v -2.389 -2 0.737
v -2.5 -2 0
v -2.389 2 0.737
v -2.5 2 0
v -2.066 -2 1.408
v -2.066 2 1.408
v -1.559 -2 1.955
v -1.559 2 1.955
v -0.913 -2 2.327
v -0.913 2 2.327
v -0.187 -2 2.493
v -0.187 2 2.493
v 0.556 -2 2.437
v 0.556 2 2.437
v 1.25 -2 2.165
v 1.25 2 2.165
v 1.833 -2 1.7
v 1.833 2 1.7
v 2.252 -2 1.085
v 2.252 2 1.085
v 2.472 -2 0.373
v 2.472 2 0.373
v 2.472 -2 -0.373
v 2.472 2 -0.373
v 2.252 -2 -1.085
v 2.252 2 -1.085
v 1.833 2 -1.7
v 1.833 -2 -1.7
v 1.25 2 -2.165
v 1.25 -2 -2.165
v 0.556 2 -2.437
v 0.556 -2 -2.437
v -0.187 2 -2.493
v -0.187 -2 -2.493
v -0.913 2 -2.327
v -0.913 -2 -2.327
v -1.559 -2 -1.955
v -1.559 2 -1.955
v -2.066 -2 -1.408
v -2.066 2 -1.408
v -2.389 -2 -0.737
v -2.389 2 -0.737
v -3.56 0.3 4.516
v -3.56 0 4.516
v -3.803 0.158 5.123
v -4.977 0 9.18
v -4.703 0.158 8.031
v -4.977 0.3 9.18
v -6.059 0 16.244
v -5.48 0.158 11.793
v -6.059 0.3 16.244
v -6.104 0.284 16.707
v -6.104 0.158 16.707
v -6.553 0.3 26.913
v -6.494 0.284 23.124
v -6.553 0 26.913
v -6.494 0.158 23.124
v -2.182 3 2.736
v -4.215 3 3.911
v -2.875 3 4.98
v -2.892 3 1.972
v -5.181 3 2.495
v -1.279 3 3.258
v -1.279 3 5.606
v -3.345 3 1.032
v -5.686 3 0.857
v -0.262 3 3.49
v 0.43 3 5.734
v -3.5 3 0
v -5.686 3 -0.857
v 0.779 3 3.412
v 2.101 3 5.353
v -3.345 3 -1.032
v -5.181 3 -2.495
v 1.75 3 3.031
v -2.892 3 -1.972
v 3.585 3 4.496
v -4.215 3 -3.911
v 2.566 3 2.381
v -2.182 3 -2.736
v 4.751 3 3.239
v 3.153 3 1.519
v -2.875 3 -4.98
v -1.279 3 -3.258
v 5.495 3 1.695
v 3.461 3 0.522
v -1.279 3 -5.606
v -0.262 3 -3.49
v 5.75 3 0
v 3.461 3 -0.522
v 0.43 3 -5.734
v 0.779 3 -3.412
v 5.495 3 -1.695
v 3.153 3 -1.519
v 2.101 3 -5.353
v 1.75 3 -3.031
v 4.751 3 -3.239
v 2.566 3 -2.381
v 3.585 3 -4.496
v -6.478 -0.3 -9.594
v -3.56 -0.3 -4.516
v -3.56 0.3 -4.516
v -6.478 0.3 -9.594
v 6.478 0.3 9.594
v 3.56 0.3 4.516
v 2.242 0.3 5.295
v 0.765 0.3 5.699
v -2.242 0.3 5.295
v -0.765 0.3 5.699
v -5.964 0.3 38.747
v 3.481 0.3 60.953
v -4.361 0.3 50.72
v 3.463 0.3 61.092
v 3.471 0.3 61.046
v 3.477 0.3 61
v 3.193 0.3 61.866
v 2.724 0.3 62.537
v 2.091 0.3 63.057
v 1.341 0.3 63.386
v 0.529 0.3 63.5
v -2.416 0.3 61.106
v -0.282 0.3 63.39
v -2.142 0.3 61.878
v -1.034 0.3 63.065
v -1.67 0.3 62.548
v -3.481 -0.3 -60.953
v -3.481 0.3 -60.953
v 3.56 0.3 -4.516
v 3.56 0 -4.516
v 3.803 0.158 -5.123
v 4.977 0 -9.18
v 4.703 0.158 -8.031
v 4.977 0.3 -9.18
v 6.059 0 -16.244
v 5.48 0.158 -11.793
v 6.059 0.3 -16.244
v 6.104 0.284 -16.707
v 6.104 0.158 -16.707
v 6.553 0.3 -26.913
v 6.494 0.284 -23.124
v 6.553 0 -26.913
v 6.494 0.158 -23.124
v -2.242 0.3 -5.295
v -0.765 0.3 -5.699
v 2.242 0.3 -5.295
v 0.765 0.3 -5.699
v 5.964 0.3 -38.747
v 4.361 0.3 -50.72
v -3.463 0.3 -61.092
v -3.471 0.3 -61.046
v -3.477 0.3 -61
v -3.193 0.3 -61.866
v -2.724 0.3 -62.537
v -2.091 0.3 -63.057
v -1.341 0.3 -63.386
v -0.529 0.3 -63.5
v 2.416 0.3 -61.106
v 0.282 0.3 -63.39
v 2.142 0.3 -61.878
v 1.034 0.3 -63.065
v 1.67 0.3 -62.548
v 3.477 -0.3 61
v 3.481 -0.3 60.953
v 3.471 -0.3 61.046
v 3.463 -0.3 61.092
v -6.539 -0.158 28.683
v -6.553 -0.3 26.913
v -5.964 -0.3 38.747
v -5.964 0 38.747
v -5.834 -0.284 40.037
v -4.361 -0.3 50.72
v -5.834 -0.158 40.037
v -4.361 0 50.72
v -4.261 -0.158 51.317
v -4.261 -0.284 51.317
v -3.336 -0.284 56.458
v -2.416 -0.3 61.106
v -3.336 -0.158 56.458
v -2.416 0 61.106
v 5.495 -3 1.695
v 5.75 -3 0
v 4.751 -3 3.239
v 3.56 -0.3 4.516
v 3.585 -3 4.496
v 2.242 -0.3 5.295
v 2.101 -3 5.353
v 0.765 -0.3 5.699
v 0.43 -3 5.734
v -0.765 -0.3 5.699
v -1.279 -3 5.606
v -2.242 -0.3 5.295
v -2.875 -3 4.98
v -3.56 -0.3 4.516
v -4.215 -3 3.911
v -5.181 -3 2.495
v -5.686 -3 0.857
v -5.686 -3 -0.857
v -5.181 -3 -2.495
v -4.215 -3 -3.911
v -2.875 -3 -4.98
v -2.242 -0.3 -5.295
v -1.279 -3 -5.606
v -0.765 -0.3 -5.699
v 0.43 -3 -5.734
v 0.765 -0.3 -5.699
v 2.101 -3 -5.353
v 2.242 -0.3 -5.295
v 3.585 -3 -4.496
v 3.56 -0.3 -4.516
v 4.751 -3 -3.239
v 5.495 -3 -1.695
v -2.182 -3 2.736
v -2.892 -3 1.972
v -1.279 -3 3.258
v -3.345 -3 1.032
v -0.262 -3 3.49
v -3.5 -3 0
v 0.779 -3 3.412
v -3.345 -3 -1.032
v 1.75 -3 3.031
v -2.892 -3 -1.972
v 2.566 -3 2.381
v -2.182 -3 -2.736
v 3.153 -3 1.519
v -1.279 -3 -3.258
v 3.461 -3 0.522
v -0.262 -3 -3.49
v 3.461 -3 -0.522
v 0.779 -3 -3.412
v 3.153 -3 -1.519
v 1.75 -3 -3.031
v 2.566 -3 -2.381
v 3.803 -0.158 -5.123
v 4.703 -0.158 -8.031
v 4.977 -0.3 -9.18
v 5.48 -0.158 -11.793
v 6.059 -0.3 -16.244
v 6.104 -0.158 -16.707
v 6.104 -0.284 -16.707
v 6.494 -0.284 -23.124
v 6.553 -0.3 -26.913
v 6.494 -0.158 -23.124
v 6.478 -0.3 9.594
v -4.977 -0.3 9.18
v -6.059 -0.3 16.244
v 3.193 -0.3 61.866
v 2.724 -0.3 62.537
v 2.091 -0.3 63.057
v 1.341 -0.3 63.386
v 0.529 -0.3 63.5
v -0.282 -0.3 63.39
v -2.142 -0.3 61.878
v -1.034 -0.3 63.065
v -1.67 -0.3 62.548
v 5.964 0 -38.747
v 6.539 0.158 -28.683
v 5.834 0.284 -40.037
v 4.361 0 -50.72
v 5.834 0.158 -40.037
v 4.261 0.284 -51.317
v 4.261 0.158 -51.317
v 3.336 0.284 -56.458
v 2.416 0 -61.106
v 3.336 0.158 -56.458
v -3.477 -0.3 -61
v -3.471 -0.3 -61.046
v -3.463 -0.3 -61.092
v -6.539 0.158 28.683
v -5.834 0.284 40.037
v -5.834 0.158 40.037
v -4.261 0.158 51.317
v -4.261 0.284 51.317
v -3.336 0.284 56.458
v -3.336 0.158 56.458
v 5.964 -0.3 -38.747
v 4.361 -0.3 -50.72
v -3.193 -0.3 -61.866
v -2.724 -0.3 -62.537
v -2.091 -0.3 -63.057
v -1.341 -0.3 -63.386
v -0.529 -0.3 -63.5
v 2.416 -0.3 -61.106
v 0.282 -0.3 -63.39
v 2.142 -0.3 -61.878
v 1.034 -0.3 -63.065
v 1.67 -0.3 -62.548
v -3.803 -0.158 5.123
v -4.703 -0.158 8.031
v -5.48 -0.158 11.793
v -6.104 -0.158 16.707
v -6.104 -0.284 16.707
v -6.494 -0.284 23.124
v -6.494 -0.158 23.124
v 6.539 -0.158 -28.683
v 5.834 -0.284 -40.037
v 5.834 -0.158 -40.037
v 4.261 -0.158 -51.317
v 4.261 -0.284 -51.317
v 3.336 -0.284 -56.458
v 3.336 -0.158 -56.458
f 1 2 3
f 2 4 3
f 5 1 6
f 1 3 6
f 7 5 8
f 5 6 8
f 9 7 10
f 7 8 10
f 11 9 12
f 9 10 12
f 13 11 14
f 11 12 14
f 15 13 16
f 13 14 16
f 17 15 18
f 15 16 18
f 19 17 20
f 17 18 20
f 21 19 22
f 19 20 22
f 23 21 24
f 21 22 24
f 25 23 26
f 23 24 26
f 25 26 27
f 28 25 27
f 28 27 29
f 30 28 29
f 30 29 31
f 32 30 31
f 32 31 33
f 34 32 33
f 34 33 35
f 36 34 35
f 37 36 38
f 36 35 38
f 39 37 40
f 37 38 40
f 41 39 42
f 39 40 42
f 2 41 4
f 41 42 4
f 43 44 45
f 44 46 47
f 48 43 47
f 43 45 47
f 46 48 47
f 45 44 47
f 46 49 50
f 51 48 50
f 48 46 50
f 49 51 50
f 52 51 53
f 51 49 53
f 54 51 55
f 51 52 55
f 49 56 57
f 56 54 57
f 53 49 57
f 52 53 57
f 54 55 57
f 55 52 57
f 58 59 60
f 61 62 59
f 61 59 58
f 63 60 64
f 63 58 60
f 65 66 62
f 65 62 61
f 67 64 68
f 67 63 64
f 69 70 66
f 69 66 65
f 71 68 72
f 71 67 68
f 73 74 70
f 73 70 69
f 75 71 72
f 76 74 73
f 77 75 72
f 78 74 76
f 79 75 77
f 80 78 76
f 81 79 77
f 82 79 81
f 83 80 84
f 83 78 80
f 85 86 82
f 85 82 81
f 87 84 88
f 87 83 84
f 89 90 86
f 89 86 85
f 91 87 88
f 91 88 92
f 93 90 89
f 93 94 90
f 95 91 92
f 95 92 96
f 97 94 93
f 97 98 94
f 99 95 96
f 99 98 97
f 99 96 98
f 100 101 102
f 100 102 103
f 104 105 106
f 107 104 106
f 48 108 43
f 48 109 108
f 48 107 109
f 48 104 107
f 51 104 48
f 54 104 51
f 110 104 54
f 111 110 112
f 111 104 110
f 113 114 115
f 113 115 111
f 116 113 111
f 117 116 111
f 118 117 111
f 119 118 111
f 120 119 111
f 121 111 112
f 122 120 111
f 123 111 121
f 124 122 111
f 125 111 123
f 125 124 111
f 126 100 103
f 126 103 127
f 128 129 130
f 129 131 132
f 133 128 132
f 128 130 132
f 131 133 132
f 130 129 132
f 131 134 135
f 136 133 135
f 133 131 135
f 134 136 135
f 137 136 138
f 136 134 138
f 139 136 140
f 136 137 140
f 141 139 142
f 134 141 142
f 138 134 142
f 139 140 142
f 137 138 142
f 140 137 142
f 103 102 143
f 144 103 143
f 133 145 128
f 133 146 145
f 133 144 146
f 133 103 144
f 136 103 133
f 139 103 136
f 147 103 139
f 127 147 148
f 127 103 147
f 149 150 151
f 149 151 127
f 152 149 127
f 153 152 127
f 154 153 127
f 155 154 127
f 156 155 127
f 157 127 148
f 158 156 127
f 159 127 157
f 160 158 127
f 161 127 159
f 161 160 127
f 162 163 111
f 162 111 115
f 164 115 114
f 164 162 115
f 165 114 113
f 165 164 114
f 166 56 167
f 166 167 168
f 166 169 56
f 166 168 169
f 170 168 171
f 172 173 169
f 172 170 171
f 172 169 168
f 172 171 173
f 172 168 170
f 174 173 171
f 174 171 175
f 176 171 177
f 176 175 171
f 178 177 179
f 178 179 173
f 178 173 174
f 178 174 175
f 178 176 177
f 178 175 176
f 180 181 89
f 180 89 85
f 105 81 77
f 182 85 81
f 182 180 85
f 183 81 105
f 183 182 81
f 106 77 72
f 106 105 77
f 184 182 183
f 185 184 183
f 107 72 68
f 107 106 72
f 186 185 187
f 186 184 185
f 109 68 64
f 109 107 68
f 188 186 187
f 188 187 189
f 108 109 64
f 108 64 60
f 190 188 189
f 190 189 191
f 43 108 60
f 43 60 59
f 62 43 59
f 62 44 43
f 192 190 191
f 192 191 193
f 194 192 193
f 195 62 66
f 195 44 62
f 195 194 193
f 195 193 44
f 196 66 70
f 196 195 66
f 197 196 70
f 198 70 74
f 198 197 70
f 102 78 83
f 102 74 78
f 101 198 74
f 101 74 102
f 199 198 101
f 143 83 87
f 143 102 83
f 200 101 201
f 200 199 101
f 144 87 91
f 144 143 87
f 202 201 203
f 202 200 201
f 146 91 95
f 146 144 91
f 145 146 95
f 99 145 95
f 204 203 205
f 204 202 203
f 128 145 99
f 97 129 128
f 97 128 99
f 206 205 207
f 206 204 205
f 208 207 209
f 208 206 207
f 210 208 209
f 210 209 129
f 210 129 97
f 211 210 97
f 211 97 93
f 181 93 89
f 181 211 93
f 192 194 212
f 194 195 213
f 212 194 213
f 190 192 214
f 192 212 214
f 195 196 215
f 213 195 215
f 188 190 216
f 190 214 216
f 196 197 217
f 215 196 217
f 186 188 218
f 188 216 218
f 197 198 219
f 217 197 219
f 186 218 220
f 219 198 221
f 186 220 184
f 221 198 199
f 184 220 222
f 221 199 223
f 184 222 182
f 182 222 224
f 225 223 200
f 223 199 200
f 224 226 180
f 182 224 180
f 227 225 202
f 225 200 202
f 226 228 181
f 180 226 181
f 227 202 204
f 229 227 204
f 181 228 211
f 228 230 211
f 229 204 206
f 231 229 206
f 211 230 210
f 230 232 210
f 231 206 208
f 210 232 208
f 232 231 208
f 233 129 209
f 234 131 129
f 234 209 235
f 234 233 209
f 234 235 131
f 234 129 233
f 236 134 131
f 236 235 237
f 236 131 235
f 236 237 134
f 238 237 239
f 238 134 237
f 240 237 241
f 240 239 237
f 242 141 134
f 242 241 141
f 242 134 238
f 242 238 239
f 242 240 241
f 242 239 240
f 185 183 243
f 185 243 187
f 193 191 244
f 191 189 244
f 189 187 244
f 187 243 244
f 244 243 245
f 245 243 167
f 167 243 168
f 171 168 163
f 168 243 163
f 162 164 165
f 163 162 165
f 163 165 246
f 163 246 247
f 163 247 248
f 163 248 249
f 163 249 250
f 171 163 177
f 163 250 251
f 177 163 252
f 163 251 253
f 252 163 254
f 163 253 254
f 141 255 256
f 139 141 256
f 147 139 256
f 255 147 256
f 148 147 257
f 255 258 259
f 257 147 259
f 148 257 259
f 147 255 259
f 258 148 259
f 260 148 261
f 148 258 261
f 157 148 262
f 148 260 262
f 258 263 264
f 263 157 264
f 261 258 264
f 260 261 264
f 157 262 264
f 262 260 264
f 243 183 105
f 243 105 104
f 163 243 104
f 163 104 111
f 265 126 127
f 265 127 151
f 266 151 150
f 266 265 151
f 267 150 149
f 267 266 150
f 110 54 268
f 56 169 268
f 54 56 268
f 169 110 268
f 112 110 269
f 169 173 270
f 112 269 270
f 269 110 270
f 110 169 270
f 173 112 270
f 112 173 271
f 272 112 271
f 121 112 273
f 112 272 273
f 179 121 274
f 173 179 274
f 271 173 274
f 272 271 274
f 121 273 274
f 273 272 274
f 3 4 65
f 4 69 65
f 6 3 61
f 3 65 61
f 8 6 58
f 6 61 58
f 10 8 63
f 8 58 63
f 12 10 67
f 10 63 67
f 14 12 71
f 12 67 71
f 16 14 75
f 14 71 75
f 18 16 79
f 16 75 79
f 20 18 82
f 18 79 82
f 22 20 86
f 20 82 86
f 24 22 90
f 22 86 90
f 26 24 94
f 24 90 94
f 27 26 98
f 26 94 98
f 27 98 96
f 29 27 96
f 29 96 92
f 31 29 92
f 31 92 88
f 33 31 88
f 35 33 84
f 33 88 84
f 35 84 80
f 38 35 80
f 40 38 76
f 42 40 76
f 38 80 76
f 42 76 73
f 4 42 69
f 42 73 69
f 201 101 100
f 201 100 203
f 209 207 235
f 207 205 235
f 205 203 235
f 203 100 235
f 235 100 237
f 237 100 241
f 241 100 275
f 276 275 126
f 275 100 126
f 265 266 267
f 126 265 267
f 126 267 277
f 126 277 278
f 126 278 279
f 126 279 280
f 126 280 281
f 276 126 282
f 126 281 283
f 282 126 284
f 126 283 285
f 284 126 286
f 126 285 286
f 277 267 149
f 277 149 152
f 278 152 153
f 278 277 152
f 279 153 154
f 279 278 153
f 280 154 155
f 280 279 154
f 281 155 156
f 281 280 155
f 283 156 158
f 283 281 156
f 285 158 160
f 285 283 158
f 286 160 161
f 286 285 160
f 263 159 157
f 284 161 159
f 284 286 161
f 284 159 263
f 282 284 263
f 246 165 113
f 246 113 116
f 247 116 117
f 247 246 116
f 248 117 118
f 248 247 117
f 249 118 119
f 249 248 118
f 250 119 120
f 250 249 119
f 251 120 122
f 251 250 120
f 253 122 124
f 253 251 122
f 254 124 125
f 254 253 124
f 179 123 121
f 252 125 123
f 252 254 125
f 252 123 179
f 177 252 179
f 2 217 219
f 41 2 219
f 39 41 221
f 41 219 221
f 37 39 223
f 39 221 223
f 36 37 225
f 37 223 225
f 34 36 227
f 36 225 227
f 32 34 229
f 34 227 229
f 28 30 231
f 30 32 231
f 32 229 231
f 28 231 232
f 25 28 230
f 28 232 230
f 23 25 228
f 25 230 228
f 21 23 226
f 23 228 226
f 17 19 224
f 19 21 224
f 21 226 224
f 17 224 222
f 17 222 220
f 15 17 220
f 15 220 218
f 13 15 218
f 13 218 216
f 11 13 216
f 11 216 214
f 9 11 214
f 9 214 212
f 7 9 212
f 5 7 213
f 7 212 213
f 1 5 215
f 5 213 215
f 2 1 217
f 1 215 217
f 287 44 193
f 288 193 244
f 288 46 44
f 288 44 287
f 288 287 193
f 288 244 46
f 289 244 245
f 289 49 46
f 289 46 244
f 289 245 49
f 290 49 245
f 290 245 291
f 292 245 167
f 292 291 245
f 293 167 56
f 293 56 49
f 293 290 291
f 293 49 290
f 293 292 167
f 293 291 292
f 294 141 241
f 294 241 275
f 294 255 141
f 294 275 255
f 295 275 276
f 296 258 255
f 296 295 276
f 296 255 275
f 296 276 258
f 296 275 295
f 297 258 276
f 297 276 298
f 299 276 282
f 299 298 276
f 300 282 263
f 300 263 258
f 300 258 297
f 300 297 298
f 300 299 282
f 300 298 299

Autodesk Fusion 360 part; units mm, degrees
sketch "Sketch1" plane through (0, 0, 0) normal (0, 1, 0) x (1, 0, 0)
  circle A0 centre (0, 0) radius 5.75
  dimension "d1" = 11.5
extrude "Extrude1" add sketch "Sketch1" along normal mid plane 6
sketch "Sketch2" plane through (0, 0, 0) normal (0, 0, 1) x (1, 0, 0)
  line L0 (5.75, 3) -> (-5.75, 3)
  line L1 (-5.75, -3) -> (5.75, -3)
  line L2 (-5.99, 1.3829) -> (5.9749, -1.3794)
  dimension "d4" = 13
sketch "Sketch3" plane through (0, 0, 0) normal (0, 1, 0) x (1, 0, 0)
  circle A0 centre (0, 0) radius 5.75
  line L0 (-3.5598, 4.5155) -> (-6.478, 9.5938)
  line L1 (-6.478, 9.5938) -> (-3.4813, 60.953)
  spline S0 degree 5 poles (3.5598, 4.5155) (3.6773, 4.794) (3.9082, 5.3773) (4.2425, 6.332) (4.664, 7.7653) (5.1484, 9.8443) (5.5861, 12.2602) (5.9693, 15.1008) (6.2849, 18.4604) (6.5067, 22.3972) (6.6011, 26.9122) (6.5015, 31.8707) (6.167, 37.0685) (5.6191, 42.3359) (4.9052, 47.5085) (4.0907, 52.4479) (3.4107, 56.1235) (2.9079, 58.6916) (2.5788, 60.3158) (2.4158, 61.106) knots 0 0 0 0 0 0 0.066667 0.133333 0.2 0.266667 0.333333 0.4 0.466667 0.533333 0.6 0.666667 0.733333 0.8 0.866667 0.933333 1 1 1 1 1 1
  line L2 (-2.2481, 63.5) -> (-1.4613, 63.5)
  arc A1 (2.4158, 61.106) -> (-3.4633, 61.0922) centre (-0.5223, 60.5) ccw
  arc A2 (-3.4633, 61.0922) -> (-3.4813, 60.953) centre (-2.483, 60.8948) ccw
  line L3 (-3.5598, 4.5155) -> (3.5598, 4.5155) construction
  line L4 (6.5565, 20.5742) -> (6.5493, 33.2506)
  point P0 (5.1258, 9.8758)
  point P1 (6.5529, 26.9124)
  dimension "d5" = 3
  dimension "d6" = 1
  dimension "d7" = 63.5
  dimension "d9" = 12
extrude "Extrude2" add sketch "Sketch3" along normal mid plane 0.6 contours A0 L0 L1 S0 A1 A2
pattern_circular "C-Pattern1" count 2 over 360 about axis through (0, 1.75, 0) along (0, 1, 0) of "Extrude2"
sketch "Sketch4" plane through (0, 3, 0) normal (0, 1, 0) x (-1, 0, 0)
  circle A0 centre (0, 0) radius 5.75
  circle A1 centre (0, 0) radius 2.5
  dimension "d16" = 5
extrude "Extrude3" cut sketch "Sketch4" against normal blind 16 contours A1
chamfer "Chamfer1" distance 1 angle 45 2 edges at (2.3308, 3, 0.904) (2.3308, -3, -0.904)
